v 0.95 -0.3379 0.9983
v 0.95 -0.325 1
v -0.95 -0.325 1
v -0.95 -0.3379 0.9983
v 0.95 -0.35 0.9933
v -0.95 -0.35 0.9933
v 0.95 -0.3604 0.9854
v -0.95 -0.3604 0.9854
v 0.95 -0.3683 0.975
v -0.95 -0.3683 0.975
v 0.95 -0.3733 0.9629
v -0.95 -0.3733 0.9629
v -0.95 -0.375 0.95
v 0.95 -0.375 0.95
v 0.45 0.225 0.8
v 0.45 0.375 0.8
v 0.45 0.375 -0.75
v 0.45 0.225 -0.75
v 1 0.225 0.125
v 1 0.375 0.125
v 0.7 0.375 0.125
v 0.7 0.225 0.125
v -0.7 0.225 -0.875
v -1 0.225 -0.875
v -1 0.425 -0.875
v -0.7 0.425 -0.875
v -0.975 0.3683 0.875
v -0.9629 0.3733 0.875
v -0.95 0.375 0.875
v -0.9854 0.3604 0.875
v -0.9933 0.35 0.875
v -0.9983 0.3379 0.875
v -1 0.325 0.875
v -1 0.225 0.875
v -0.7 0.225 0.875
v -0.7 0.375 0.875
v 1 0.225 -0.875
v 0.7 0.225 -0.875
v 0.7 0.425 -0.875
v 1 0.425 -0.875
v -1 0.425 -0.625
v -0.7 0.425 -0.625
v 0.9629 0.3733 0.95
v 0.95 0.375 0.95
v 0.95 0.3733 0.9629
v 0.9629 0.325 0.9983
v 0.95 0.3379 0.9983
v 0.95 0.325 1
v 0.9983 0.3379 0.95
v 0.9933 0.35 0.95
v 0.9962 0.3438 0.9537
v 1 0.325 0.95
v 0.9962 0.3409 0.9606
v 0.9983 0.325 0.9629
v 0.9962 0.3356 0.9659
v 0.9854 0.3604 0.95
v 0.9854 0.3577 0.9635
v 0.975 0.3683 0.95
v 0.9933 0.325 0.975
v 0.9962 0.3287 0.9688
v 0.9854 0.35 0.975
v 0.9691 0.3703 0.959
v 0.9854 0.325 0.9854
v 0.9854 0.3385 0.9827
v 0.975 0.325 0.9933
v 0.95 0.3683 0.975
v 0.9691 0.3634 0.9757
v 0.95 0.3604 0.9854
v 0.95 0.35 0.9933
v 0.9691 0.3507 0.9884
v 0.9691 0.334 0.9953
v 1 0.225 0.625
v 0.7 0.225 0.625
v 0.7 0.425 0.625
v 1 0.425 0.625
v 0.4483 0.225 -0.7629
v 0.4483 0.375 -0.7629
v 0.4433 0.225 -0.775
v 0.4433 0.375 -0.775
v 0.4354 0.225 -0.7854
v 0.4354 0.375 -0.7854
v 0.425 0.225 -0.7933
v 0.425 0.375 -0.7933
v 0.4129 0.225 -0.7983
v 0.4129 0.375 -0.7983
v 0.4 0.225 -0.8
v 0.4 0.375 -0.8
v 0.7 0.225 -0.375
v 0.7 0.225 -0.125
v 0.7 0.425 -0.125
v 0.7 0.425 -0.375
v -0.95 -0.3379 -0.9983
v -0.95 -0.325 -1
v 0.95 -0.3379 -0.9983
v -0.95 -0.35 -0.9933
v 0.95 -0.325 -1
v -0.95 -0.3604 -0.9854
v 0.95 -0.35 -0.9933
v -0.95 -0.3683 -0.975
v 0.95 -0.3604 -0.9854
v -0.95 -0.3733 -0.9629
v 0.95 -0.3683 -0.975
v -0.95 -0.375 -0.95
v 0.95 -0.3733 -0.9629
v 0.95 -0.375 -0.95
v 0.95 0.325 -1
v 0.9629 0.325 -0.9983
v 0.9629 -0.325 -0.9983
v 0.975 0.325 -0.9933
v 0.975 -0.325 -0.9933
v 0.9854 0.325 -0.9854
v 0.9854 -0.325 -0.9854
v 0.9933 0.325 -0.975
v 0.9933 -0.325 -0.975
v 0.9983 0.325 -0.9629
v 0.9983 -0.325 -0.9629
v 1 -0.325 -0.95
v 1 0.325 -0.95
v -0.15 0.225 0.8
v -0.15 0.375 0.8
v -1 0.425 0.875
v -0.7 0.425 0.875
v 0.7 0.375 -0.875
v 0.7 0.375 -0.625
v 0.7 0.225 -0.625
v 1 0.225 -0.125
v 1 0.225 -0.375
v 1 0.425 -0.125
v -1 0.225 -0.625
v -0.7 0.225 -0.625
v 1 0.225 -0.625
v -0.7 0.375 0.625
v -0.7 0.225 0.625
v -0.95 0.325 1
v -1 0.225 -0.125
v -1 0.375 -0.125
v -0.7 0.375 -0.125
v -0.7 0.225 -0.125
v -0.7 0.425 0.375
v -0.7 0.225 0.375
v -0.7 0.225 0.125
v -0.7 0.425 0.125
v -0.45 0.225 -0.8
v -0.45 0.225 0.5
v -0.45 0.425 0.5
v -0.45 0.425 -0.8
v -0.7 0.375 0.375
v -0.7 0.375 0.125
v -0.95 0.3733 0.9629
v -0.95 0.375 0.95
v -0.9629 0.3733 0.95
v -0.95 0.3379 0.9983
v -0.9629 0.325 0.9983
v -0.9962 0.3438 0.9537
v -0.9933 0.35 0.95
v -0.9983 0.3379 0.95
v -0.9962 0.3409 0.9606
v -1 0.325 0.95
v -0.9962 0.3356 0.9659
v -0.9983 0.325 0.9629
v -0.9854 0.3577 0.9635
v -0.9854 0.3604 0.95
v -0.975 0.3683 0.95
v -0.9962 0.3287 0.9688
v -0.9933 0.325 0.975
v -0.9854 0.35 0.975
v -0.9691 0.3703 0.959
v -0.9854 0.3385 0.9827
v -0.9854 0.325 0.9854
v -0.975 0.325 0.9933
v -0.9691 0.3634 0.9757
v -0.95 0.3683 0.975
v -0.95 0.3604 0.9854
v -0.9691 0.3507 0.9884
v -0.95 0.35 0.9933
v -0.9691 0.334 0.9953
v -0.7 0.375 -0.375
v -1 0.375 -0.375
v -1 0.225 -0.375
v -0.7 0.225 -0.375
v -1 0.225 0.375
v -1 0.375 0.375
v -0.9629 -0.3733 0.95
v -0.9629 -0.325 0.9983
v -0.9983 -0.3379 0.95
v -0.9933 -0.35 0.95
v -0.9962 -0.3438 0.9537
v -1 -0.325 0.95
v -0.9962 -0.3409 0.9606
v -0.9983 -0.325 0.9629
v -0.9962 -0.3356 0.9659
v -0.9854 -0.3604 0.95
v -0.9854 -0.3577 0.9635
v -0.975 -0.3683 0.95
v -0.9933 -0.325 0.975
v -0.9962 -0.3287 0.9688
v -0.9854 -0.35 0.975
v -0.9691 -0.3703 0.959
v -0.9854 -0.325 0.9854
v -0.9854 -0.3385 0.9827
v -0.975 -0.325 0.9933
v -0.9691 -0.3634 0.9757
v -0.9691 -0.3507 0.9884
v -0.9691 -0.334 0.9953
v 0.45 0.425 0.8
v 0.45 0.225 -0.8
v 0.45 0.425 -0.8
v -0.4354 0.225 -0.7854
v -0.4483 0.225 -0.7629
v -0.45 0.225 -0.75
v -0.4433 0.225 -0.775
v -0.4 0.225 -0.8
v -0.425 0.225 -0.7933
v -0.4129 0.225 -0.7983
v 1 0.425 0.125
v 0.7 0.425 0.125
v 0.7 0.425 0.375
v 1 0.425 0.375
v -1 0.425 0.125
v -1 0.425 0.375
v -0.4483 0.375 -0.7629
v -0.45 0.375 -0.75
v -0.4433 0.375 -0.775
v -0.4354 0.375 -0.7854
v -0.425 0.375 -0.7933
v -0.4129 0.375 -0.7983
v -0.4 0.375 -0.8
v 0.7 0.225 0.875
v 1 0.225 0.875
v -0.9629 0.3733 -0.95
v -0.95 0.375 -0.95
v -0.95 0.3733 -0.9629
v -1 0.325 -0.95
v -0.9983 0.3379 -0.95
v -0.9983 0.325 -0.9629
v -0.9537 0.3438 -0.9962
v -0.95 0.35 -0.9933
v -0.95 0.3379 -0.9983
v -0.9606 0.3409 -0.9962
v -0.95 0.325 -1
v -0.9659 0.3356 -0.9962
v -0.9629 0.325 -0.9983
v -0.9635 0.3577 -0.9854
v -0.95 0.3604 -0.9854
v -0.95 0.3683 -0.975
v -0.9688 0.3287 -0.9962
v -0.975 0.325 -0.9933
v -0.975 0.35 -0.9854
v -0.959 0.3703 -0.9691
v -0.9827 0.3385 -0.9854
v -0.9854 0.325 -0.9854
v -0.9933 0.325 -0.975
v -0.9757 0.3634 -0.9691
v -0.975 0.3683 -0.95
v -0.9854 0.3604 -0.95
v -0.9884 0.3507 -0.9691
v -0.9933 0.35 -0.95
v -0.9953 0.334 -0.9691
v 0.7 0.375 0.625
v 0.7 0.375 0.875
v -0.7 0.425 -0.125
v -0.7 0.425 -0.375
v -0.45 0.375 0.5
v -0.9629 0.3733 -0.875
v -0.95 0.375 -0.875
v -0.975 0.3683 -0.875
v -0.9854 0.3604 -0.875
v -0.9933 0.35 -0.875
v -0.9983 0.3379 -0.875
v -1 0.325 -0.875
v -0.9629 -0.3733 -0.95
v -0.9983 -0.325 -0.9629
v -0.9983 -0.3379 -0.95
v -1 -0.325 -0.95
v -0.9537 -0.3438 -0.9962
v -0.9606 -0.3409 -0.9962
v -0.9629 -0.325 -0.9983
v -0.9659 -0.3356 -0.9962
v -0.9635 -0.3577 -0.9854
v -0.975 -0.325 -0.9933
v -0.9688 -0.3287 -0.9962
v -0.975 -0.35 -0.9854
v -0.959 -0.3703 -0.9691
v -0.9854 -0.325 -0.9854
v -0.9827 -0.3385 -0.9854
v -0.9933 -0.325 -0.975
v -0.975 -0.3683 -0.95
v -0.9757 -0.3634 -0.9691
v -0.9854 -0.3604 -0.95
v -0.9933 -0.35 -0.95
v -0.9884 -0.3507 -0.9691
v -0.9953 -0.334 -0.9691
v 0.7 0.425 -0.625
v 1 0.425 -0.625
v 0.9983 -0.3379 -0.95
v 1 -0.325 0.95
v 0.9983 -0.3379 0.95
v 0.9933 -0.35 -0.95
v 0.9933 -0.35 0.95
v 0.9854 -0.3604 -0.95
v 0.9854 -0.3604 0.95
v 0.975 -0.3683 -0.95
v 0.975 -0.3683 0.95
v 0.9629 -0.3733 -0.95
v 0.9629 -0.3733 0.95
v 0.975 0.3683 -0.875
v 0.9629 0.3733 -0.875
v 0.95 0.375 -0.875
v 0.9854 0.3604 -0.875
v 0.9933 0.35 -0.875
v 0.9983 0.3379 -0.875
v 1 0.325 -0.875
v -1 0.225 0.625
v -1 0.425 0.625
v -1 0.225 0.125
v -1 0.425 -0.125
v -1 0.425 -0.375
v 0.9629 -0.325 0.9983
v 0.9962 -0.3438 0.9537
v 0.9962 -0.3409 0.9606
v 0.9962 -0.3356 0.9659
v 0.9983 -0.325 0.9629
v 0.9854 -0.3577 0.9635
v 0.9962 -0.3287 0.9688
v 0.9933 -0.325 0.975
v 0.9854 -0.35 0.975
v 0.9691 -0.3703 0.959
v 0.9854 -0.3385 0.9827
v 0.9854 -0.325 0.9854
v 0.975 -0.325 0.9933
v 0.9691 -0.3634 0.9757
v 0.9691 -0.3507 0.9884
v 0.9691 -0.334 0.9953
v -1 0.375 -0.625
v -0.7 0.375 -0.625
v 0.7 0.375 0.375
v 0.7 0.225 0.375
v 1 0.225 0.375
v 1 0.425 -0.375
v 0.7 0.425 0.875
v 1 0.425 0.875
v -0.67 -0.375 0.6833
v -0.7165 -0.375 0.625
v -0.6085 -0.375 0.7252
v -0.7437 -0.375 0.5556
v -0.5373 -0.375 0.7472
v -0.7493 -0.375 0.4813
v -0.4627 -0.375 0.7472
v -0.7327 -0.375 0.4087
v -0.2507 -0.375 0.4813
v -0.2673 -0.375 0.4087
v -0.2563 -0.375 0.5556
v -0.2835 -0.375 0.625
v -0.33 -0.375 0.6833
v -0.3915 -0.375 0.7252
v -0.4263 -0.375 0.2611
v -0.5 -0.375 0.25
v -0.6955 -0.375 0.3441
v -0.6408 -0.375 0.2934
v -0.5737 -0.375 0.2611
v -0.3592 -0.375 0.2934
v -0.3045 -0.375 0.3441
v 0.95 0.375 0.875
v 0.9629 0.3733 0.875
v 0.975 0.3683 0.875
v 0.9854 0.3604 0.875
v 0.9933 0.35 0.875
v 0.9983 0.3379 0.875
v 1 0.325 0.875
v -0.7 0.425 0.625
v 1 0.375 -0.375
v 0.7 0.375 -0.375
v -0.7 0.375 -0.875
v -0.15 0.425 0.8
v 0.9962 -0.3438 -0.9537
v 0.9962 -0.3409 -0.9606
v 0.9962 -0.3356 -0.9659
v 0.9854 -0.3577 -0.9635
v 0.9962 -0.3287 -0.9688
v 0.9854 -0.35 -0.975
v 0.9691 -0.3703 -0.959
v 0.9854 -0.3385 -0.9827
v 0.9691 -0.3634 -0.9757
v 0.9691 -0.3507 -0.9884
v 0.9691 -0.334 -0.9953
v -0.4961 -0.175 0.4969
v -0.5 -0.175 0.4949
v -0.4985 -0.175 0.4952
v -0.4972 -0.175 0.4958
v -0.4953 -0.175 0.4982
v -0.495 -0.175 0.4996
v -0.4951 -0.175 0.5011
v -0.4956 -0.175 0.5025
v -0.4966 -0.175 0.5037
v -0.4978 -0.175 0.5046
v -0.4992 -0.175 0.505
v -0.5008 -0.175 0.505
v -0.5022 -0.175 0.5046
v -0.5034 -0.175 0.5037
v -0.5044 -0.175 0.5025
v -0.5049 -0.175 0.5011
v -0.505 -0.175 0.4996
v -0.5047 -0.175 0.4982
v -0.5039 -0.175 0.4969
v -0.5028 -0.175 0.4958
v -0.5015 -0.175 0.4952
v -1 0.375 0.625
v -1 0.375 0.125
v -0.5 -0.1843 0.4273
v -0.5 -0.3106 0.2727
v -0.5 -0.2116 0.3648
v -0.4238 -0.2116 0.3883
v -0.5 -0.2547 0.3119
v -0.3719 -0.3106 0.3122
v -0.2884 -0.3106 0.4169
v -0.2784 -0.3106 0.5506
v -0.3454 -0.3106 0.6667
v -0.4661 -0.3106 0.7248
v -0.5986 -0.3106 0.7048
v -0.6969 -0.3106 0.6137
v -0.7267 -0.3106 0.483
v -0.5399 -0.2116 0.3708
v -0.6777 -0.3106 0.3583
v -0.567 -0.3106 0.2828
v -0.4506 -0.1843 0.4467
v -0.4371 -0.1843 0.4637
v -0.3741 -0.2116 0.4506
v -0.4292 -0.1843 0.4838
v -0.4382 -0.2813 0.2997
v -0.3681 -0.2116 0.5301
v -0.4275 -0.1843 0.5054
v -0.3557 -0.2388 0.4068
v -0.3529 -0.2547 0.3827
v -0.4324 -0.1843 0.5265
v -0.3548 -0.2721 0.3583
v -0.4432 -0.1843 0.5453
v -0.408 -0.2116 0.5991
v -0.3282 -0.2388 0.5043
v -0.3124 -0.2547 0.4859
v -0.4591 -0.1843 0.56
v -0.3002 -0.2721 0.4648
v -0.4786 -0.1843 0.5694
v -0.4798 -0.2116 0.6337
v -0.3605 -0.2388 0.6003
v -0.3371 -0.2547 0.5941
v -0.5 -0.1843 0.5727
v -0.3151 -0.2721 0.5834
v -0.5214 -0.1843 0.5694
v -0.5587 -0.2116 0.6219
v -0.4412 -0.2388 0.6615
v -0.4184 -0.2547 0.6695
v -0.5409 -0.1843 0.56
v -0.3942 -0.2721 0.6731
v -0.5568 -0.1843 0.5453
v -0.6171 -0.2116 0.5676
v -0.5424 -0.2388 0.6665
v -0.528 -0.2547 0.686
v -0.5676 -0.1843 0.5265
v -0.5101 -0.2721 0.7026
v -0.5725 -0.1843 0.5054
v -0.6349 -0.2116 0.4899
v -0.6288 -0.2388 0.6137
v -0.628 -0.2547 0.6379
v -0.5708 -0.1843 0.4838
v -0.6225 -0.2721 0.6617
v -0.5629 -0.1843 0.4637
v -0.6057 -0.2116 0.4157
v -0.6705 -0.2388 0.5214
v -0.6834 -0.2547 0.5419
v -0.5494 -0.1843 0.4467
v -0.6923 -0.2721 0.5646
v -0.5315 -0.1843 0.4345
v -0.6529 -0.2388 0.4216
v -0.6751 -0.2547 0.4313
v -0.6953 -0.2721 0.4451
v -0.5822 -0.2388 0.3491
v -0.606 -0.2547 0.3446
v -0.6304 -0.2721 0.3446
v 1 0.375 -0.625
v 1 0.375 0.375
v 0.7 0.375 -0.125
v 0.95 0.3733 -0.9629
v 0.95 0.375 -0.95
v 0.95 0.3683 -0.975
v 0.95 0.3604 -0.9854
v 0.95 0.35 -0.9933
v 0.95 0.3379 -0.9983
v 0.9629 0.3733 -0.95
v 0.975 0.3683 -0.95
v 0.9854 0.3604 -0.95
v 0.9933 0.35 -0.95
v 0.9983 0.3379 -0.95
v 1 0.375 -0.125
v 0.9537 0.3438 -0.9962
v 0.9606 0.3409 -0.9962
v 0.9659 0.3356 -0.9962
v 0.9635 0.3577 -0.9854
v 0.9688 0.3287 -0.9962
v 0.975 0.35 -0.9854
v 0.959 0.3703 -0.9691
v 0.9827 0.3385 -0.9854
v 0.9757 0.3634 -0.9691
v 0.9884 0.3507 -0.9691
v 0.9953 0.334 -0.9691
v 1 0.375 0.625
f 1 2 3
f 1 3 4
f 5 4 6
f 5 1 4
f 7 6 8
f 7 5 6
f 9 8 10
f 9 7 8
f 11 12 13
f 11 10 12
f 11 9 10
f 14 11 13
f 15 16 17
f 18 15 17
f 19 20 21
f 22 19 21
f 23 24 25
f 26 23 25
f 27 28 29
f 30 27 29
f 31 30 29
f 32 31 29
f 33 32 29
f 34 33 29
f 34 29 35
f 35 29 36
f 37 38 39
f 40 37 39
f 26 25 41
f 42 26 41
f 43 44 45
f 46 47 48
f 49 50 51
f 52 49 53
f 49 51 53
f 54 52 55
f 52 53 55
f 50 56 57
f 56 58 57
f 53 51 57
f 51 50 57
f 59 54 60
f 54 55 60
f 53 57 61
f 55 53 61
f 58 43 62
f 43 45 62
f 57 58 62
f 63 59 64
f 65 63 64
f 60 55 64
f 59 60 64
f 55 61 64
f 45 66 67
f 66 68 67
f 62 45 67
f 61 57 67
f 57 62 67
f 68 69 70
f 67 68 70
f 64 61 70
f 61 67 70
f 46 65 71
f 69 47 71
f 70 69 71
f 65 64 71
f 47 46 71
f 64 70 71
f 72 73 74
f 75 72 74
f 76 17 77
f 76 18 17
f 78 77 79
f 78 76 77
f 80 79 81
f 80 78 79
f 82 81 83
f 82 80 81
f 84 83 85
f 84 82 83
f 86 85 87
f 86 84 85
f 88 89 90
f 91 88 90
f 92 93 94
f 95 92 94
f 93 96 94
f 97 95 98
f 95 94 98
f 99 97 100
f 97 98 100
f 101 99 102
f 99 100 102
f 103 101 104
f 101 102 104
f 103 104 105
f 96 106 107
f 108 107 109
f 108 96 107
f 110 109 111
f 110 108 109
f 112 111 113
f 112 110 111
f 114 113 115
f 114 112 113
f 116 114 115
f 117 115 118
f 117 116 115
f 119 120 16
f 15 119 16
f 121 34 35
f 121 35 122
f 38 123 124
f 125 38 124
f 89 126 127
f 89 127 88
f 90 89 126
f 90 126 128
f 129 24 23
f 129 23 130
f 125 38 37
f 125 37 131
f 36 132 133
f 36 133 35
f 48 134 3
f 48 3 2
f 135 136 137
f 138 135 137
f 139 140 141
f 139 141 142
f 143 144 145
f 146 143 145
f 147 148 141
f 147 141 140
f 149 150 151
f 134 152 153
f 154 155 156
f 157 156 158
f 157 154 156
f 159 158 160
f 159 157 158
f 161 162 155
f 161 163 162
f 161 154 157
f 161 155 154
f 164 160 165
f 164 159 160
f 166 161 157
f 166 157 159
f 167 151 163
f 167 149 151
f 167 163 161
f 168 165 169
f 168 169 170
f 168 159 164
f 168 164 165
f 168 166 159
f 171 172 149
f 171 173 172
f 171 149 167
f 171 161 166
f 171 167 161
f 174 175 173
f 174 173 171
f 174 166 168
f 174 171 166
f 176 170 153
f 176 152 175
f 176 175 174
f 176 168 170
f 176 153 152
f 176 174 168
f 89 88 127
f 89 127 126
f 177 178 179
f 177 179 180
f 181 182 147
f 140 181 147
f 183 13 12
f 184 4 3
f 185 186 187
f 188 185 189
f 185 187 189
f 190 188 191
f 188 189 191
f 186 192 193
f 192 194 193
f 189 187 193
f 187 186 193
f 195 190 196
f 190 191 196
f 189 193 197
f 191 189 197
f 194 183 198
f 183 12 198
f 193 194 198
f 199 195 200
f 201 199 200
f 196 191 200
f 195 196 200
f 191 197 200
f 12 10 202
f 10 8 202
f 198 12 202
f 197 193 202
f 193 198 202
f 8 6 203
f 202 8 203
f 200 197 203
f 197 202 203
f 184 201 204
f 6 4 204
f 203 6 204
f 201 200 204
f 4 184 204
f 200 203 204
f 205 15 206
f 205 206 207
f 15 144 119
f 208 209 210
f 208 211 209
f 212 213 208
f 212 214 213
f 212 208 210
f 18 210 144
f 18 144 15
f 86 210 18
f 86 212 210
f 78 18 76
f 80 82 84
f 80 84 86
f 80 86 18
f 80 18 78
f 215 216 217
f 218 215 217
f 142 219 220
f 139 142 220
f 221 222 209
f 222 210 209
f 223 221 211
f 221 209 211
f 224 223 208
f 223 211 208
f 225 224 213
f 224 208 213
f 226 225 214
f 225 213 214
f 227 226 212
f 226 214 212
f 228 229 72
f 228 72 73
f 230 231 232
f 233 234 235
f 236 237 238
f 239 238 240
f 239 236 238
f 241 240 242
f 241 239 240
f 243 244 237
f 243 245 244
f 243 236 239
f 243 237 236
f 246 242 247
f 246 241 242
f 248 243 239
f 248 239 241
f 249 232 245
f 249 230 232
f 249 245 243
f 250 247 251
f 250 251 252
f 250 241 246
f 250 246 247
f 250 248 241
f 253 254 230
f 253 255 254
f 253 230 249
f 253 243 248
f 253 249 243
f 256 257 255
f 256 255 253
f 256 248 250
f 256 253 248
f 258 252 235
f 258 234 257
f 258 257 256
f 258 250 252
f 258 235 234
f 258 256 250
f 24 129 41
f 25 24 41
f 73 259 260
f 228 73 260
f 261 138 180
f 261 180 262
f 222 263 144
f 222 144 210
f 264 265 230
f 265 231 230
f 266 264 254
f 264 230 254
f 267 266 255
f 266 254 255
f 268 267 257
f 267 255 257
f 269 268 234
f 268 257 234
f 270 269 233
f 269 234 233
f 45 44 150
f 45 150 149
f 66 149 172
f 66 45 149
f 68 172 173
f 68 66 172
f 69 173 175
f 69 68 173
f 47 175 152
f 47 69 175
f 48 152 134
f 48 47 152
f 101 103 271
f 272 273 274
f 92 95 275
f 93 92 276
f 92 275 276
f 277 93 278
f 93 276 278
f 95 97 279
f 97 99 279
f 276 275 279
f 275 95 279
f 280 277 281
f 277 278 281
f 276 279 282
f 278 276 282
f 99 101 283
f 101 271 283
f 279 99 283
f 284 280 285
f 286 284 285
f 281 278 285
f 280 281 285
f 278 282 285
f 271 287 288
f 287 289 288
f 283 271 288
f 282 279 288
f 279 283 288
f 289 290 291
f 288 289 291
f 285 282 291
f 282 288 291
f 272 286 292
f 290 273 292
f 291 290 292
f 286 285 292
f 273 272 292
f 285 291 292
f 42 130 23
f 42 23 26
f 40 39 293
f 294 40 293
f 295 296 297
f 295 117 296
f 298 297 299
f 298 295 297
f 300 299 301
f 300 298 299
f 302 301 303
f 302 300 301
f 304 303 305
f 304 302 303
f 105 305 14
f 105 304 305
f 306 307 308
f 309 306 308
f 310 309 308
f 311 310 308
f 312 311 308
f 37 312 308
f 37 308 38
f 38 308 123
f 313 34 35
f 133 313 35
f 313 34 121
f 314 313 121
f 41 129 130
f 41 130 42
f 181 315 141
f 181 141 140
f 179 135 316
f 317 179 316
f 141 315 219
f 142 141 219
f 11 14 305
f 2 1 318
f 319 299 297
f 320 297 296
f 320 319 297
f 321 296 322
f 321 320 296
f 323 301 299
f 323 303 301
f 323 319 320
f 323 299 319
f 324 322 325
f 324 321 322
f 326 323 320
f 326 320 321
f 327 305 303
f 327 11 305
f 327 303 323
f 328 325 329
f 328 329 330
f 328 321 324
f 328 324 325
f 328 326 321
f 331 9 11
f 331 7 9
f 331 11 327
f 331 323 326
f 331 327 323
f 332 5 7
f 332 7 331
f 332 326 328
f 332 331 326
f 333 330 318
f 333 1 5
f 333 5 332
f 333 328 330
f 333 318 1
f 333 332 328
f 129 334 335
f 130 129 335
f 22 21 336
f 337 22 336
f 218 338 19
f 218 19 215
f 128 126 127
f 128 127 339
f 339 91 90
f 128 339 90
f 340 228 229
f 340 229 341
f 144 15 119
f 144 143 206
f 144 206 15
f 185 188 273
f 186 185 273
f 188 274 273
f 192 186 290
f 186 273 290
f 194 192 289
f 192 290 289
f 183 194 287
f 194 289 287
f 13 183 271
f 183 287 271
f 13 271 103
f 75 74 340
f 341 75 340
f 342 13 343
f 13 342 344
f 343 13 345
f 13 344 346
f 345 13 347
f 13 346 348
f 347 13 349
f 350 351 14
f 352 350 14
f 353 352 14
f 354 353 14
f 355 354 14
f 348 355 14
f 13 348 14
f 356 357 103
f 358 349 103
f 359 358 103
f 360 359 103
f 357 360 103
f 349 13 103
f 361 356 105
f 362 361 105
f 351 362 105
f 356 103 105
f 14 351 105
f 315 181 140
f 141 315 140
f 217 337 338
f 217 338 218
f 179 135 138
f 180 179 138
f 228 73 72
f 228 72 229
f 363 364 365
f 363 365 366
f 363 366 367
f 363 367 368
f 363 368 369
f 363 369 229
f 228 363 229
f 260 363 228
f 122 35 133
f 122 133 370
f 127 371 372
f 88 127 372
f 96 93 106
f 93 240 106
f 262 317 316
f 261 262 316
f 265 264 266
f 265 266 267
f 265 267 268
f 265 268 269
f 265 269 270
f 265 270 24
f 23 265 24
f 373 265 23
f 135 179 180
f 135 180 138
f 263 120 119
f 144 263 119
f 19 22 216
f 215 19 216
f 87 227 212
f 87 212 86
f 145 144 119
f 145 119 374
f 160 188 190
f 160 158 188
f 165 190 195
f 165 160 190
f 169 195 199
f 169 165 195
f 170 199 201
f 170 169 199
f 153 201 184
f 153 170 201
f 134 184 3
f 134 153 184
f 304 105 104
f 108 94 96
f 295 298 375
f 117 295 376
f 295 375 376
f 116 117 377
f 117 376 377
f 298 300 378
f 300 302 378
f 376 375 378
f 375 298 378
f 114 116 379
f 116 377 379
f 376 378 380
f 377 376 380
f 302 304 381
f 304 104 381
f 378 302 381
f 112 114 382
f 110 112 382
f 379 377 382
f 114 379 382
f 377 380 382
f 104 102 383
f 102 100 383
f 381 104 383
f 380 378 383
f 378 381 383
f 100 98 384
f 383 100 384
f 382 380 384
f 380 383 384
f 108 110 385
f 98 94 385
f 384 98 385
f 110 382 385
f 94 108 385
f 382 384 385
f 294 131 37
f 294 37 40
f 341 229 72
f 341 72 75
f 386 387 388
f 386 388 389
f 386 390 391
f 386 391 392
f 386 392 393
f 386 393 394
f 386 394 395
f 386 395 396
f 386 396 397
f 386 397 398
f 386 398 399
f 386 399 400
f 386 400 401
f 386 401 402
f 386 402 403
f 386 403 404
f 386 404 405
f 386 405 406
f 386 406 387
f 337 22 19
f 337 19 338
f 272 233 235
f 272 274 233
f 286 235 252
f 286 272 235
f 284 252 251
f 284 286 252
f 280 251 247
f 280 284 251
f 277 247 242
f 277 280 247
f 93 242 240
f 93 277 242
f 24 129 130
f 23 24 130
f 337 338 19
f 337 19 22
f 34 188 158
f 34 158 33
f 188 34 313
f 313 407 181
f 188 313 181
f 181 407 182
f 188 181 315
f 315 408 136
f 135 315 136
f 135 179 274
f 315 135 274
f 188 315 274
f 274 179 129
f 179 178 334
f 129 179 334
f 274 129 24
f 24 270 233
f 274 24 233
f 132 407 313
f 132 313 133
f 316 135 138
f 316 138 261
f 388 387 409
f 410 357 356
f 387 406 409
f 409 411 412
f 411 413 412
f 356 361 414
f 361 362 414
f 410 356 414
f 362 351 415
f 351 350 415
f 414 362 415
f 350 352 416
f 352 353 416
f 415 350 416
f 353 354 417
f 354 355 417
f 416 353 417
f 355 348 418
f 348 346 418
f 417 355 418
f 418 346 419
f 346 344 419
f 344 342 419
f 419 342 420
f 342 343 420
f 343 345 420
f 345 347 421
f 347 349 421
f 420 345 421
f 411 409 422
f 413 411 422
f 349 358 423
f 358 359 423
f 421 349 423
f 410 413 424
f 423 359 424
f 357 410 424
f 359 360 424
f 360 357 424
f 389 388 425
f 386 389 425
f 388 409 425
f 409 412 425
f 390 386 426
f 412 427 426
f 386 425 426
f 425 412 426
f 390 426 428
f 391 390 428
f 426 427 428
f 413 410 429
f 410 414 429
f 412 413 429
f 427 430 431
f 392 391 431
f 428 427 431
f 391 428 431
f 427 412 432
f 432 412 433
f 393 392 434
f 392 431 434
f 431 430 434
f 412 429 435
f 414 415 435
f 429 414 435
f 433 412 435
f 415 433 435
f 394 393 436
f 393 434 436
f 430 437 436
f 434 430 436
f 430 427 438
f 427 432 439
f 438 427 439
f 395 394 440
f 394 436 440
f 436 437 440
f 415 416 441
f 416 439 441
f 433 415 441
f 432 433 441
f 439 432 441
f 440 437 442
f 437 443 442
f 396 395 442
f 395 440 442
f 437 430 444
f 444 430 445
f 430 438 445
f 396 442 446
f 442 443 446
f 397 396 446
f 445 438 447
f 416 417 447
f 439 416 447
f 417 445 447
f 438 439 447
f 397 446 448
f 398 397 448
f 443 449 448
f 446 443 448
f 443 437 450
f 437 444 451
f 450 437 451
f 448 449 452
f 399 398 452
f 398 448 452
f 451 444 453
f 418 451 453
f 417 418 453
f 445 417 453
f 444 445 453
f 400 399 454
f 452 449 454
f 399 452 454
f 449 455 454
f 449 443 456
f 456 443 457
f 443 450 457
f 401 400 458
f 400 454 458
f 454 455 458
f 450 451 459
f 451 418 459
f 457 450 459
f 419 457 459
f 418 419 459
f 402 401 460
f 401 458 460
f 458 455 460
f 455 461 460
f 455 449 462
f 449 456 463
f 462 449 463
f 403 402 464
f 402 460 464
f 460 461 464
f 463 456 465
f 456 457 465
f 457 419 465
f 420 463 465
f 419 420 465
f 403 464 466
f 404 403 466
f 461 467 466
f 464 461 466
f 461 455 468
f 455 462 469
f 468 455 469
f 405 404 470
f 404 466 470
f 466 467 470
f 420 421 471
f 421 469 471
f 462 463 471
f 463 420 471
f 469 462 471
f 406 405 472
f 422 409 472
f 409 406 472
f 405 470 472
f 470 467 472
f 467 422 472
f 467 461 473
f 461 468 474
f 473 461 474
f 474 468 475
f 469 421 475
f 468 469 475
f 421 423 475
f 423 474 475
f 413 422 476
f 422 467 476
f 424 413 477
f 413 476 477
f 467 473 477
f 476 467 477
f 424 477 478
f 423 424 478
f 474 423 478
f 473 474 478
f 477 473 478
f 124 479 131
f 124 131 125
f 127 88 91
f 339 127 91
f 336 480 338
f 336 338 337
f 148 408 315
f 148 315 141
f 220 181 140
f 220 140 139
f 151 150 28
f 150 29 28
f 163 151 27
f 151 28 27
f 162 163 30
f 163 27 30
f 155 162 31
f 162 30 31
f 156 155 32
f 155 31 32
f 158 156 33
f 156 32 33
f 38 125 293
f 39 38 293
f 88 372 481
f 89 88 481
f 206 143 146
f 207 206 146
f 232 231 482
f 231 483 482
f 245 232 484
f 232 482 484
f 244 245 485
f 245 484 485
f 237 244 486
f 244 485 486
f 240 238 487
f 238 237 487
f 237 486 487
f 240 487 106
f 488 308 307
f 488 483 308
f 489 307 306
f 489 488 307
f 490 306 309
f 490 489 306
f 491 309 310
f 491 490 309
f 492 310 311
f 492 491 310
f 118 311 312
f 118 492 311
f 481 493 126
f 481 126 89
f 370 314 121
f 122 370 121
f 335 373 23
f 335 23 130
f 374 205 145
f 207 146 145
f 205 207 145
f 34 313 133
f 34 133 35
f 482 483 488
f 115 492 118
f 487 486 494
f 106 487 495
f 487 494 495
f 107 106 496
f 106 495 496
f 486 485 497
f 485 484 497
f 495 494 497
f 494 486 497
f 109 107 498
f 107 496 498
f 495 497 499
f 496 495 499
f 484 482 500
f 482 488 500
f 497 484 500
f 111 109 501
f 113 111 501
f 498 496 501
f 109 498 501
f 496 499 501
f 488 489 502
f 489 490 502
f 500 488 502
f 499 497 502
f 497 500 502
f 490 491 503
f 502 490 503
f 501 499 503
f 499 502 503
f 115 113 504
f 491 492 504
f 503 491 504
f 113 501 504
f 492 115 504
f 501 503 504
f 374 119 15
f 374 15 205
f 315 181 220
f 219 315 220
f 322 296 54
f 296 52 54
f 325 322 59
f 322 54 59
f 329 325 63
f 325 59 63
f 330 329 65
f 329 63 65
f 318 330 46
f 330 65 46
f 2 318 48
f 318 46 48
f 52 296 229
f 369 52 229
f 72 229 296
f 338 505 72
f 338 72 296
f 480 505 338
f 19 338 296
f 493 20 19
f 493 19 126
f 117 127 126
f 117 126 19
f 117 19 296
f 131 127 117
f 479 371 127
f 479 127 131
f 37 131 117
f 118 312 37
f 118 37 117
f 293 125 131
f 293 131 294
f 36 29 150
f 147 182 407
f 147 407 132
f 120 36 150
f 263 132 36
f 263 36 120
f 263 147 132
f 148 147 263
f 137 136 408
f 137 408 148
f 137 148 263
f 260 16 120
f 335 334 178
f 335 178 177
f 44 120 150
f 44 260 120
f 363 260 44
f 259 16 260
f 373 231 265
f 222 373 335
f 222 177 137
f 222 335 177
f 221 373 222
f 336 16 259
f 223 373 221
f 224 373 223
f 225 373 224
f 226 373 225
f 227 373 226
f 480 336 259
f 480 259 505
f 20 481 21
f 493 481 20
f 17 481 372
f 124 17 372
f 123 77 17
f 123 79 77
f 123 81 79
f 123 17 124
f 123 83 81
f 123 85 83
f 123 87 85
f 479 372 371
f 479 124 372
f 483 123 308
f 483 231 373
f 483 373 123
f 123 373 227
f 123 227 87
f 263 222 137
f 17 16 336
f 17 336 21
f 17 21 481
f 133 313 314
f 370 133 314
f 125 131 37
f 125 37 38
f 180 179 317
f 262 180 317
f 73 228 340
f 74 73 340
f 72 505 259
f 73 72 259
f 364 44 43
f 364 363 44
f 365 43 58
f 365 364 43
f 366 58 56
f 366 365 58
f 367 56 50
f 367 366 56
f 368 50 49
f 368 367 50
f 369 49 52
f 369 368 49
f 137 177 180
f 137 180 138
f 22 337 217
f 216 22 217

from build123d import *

# Parameters (mm, degrees)
SKETCH1_W                   = 2
SKETCH1_H                   = 2
EXTRUDE1_DEPTH              = 0.375
SKETCH3_W                   = 0.9
SKETCH3_H                   = 1.6
EXTRUDE3_DEPTH              = 0.2
BODY_MOVE_COPY2_START       = -0.45
BODY_MOVE_COPY2_OUTLINE_W   = 0.2
BODY_MOVE_COPY2_OUTLINE_H   = 1.6
BODY_MOVE_COPY2_DEPTH       = 0.9
SKETCH4_W                   = 0.3
SKETCH4_H                   = 0.25
BOSS_EXTRUDE1_DEPTH         = 0.2
LPATTERN1_COUNT             = 3
LPATTERN1_PITCH             = 0.5
LPATTERN1_COL_COUNT         = 2
LPATTERN1_COL_PITCH         = 0.5
BODY_MOVE_COPY3_START       = 0.7
BODY_MOVE_COPY3_OUTLINE_W   = 0.2
BODY_MOVE_COPY3_OUTLINE_H   = 0.25
BODY_MOVE_COPY3_DEPTH       = 0.3
BODY_MOVE_COPY3_2_OUTLINE_W = 0.2
BODY_MOVE_COPY3_2_OUTLINE_H = 0.25
BODY_MOVE_COPY3_2_DEPTH     = 0.3
BODY_MOVE_COPY3_3_OUTLINE_W = 0.2
BODY_MOVE_COPY3_3_OUTLINE_H = 0.25
BODY_MOVE_COPY3_3_DEPTH     = 0.3
BODY_MOVE_COPY3_4_OUTLINE_W = 0.2
BODY_MOVE_COPY3_4_OUTLINE_H = 0.25
BODY_MOVE_COPY3_4_DEPTH     = 0.3
BODY_MOVE_COPY3_START_2     = -1
BODY_MOVE_COPY3_5_OUTLINE_W = 0.2
BODY_MOVE_COPY3_5_OUTLINE_H = 0.25
BODY_MOVE_COPY3_5_DEPTH     = 0.3
BODY_MOVE_COPY3_6_OUTLINE_W = 0.2
BODY_MOVE_COPY3_6_OUTLINE_H = 0.25
BODY_MOVE_COPY3_6_DEPTH     = 0.3
BODY_MOVE_COPY3_7_OUTLINE_W = 0.2
BODY_MOVE_COPY3_7_OUTLINE_H = 0.25
BODY_MOVE_COPY3_7_DEPTH     = 0.3
BODY_MOVE_COPY3_8_OUTLINE_W = 0.2
BODY_MOVE_COPY3_8_OUTLINE_H = 0.25
BODY_MOVE_COPY3_8_DEPTH     = 0.3
FILLET_3_R                  = 0.05
FILLET1_R                   = 0.05
SKETCH_1_R                  = 0.25
CUT_EXTRUDE1_DEPTH          = 0.2
FILLET3_R                   = 0.25
CHAMFER1_SIZE               = 0.3
CHAMFER2_SIZE               = 0.3


with BuildPart() as part:
    # Sketch1 → Extrude1 (new, symmetric)
    with BuildSketch(Plane(origin=(0, 0, 0), x_dir=(1, 0, 0), z_dir=(0, 1, 0))):
        Rectangle(SKETCH1_W, SKETCH1_H)
    extrude(amount=EXTRUDE1_DEPTH, both=True)


with BuildPart() as body_2:
    # Sketch3 → Extrude3 (new body)
    with BuildSketch(Plane(origin=(0, 0.425, 0), x_dir=(1, 0, 0), z_dir=(0, 1, 0))):
        Rectangle(SKETCH3_W, SKETCH3_H)
    extrude(amount=-EXTRUDE3_DEPTH)


with BuildPart() as body_3:
    # Body-Move/Copy2: read off the stored shape, not the designer's step
    # Body-Move/Copy2 outline → Body-Move/Copy2 (new body)
    with BuildSketch(Plane.YZ.offset(BODY_MOVE_COPY2_START)):
        with Locations((0.325, 0)):
            Rectangle(BODY_MOVE_COPY2_OUTLINE_W, BODY_MOVE_COPY2_OUTLINE_H)
    extrude(amount=BODY_MOVE_COPY2_DEPTH)

    # Chamfer1
    chamfer1_edges = [body_3.edges().sort_by_distance(p)[0] for p in [
        (-0.45, 0.325, 0.8),
    ]]
    chamfer(chamfer1_edges, length=CHAMFER1_SIZE)


with BuildPart() as part_1:
    add(part.part)

    # Combine2: cut body 2
    add(body_2.part, mode=Mode.SUBTRACT)


with BuildPart() as body_3_2:
    # Sketch4 → Boss-Extrude1 (new body)
    with BuildSketch(Plane(origin=(0, 0.425, 0), x_dir=(-1, 0, 0), z_dir=(0, 1, 0))):
        with Locations((-0.85, 0.25)):
            Rectangle(SKETCH4_W, SKETCH4_H)
    boss_extrude1 = extrude(amount=-BOSS_EXTRUDE1_DEPTH)


with BuildPart() as lpattern1_1:
    # LPattern1: pattern copy
    add(boss_extrude1.moved(Location(Vector(0, 0, -1) * (1 * LPATTERN1_PITCH))))


with BuildPart() as lpattern1_2:
    # LPattern1: pattern copy
    add(boss_extrude1.moved(Location(Vector(0, 0, -1) * (2 * LPATTERN1_PITCH))))


with BuildPart() as lpattern1_col_1:
    # LPattern1 col: Boss-Extrude1 ×2
    with Locations(*[(0, 0, i * LPATTERN1_COL_PITCH) for i in range(1, LPATTERN1_COL_COUNT)]):
        add(boss_extrude1)


with BuildPart() as body_7:
    # Mirror2: mirrored copy
    add(lpattern1_2.part.mirror(Plane(origin=(0, 0, 0), x_dir=(0, 0, 1), z_dir=(1, 0, 0))))


with BuildPart() as body_8:
    # Mirror2 2: mirrored copy
    add(lpattern1_1.part.mirror(Plane(origin=(0, 0, 0), x_dir=(0, 0, 1), z_dir=(1, 0, 0))))


with BuildPart() as body_9:
    # Mirror2 3: mirrored copy
    add(body_3_2.part.mirror(Plane(origin=(0, 0, 0), x_dir=(0, 0, 1), z_dir=(1, 0, 0))))


with BuildPart() as body_10:
    # Mirror2 4: mirrored copy
    add(lpattern1_col_1.part.mirror(Plane(origin=(0, 0, 0), x_dir=(0, 0, 1), z_dir=(1, 0, 0))))


with BuildPart() as body_11:
    # Body-Move/Copy3: read off the stored shape, not the designer's step
    # Body-Move/Copy3 outline → Body-Move/Copy3 (new body)
    with BuildSketch(Plane.YZ.offset(BODY_MOVE_COPY3_START)):
        with Locations((0.325, -0.75)):
            Rectangle(BODY_MOVE_COPY3_OUTLINE_W, BODY_MOVE_COPY3_OUTLINE_H)
    extrude(amount=BODY_MOVE_COPY3_DEPTH)


with BuildPart() as body_12:
    # Body-Move_Copy3 2 outline → Body-Move_Copy3 2 (new body)
    with BuildSketch(Plane.YZ.offset(BODY_MOVE_COPY3_START)):
        with Locations((0.325, -0.25)):
            Rectangle(BODY_MOVE_COPY3_2_OUTLINE_W, BODY_MOVE_COPY3_2_OUTLINE_H)
    extrude(amount=BODY_MOVE_COPY3_2_DEPTH)


with BuildPart() as body_13:
    # Body-Move_Copy3 3 outline → Body-Move_Copy3 3 (new body)
    with BuildSketch(Plane.YZ.offset(BODY_MOVE_COPY3_START)):
        with Locations((0.325, 0.25)):
            Rectangle(BODY_MOVE_COPY3_3_OUTLINE_W, BODY_MOVE_COPY3_3_OUTLINE_H)
    extrude(amount=BODY_MOVE_COPY3_3_DEPTH)


with BuildPart() as body_14:
    # Body-Move_Copy3 4 outline → Body-Move_Copy3 4 (new body)
    with BuildSketch(Plane.YZ.offset(BODY_MOVE_COPY3_START)):
        with Locations((0.325, 0.75)):
            Rectangle(BODY_MOVE_COPY3_4_OUTLINE_W, BODY_MOVE_COPY3_4_OUTLINE_H)
    extrude(amount=BODY_MOVE_COPY3_4_DEPTH)


with BuildPart() as body_15:
    # Body-Move_Copy3 5 outline → Body-Move_Copy3 5 (new body)
    with BuildSketch(Plane.YZ.offset(BODY_MOVE_COPY3_START_2)):
        with Locations((0.325, 0.75)):
            Rectangle(BODY_MOVE_COPY3_5_OUTLINE_W, BODY_MOVE_COPY3_5_OUTLINE_H)
    extrude(amount=BODY_MOVE_COPY3_5_DEPTH)


with BuildPart() as body_16:
    # Body-Move_Copy3 6 outline → Body-Move_Copy3 6 (new body)
    with BuildSketch(Plane.YZ.offset(BODY_MOVE_COPY3_START_2)):
        with Locations((0.325, 0.25)):
            Rectangle(BODY_MOVE_COPY3_6_OUTLINE_W, BODY_MOVE_COPY3_6_OUTLINE_H)
    extrude(amount=BODY_MOVE_COPY3_6_DEPTH)


with BuildPart() as body_17:
    # Body-Move_Copy3 7 outline → Body-Move_Copy3 7 (new body)
    with BuildSketch(Plane.YZ.offset(BODY_MOVE_COPY3_START_2)):
        with Locations((0.325, -0.25)):
            Rectangle(BODY_MOVE_COPY3_7_OUTLINE_W, BODY_MOVE_COPY3_7_OUTLINE_H)
    extrude(amount=BODY_MOVE_COPY3_7_DEPTH)


with BuildPart() as body_18:
    # Body-Move_Copy3 8 outline → Body-Move_Copy3 8 (new body)
    with BuildSketch(Plane.YZ.offset(BODY_MOVE_COPY3_START_2)):
        with Locations((0.325, -0.75)):
            Rectangle(BODY_MOVE_COPY3_8_OUTLINE_W, BODY_MOVE_COPY3_8_OUTLINE_H)
    extrude(amount=BODY_MOVE_COPY3_8_DEPTH)


with BuildPart() as part_2:
    add(part_1.part)

    # Combine4: read off the stored shape, not the designer's step
    # Combine4: cut LPattern1_2, LPattern1_1, body 3 2, LPattern1 col_1, body 10, body 9, body 8, body 7
    add(lpattern1_2.part, mode=Mode.SUBTRACT)
    add(lpattern1_1.part, mode=Mode.SUBTRACT)
    add(body_3_2.part, mode=Mode.SUBTRACT)
    add(lpattern1_col_1.part, mode=Mode.SUBTRACT)
    add(body_10.part, mode=Mode.SUBTRACT)
    add(body_9.part, mode=Mode.SUBTRACT)
    add(body_8.part, mode=Mode.SUBTRACT)
    add(body_7.part, mode=Mode.SUBTRACT)

    # Скругление3
    fillet_3_edges = [part_2.edges().sort_by_distance(p)[0] for p in [
        (0.45, 0.3, -0.8),
        (-0.45, 0.3, -0.8),
    ]]
    fillet(fillet_3_edges, radius=FILLET_3_R)

    # Fillet1
    fillet1_edges = [part_2.edges().sort_by_distance(p)[0] for p in [
        (-1, 0.375, -0.9375),
        (1, 0.375, -0.9375),
        (0, 0.375, 1),
        (1, 0.375, 0.9375),
        (0, -0.375, 1),
        (-1, -0.375, 0),
        (0, -0.375, -1),
        (1, -0.375, 0),
        (0, 0.375, -1),
        (-1, 0.375, 0.9375),
        (1, 0, 1),
        (-1, 0, 1),
        (-1, 0, -1),
        (1, 0, -1),
    ]]
    fillet(fillet1_edges, radius=FILLET1_R)

    # Эскиз1 → Cut-Extrude1 (cut)
    with BuildSketch(Plane.XZ.offset(0.375)):
        with Locations(Location((-0.5, 0.5, 0), (0, 0, 270))):
            Circle(SKETCH_1_R)
    extrude(amount=-CUT_EXTRUDE1_DEPTH, mode=Mode.SUBTRACT)

    # Fillet3
    # the kernel refuses this fillet: 0.25 mm, written as the material it adds along each edge
    with BuildSketch(Plane(origin=(-0.5, -0.175, 0.5), x_dir=(0, 0, -1), z_dir=(-1, 0, 0))) as fillet3_piece_1:
        with BuildLine():
            CenterArc((0.005051026, 0.25), FILLET3_R, 270, 78.463040967)
            Line((0.005051026, 0), (0.005051026, -0.005))
            Line((0.005051026, -0.005), (0.25, -0.005))
            Line((0.25, -0.005), (0.255, 0))
            ThreePointArc((0.255, 0), (0.255, 0.1), (0.254898979, 0.199))
            Line((0.254898979, 0.199), (0.25, 0.2))
        make_face()
    revolve(axis=Axis((-0.5, -0.175, 0.5), (0, -1, 0)))

    # Chamfer2
    chamfer2_edges = [part_2.edges().sort_by_distance(p)[0] for p in [
        (-0.45, 0.3, 0.8),
    ]]
    chamfer(chamfer2_edges, length=CHAMFER2_SIZE)


solid = Compound([body_3.part, body_11.part, body_12.part, body_13.part, body_14.part, body_15.part, body_16.part, body_17.part, body_18.part, part_2.part])
